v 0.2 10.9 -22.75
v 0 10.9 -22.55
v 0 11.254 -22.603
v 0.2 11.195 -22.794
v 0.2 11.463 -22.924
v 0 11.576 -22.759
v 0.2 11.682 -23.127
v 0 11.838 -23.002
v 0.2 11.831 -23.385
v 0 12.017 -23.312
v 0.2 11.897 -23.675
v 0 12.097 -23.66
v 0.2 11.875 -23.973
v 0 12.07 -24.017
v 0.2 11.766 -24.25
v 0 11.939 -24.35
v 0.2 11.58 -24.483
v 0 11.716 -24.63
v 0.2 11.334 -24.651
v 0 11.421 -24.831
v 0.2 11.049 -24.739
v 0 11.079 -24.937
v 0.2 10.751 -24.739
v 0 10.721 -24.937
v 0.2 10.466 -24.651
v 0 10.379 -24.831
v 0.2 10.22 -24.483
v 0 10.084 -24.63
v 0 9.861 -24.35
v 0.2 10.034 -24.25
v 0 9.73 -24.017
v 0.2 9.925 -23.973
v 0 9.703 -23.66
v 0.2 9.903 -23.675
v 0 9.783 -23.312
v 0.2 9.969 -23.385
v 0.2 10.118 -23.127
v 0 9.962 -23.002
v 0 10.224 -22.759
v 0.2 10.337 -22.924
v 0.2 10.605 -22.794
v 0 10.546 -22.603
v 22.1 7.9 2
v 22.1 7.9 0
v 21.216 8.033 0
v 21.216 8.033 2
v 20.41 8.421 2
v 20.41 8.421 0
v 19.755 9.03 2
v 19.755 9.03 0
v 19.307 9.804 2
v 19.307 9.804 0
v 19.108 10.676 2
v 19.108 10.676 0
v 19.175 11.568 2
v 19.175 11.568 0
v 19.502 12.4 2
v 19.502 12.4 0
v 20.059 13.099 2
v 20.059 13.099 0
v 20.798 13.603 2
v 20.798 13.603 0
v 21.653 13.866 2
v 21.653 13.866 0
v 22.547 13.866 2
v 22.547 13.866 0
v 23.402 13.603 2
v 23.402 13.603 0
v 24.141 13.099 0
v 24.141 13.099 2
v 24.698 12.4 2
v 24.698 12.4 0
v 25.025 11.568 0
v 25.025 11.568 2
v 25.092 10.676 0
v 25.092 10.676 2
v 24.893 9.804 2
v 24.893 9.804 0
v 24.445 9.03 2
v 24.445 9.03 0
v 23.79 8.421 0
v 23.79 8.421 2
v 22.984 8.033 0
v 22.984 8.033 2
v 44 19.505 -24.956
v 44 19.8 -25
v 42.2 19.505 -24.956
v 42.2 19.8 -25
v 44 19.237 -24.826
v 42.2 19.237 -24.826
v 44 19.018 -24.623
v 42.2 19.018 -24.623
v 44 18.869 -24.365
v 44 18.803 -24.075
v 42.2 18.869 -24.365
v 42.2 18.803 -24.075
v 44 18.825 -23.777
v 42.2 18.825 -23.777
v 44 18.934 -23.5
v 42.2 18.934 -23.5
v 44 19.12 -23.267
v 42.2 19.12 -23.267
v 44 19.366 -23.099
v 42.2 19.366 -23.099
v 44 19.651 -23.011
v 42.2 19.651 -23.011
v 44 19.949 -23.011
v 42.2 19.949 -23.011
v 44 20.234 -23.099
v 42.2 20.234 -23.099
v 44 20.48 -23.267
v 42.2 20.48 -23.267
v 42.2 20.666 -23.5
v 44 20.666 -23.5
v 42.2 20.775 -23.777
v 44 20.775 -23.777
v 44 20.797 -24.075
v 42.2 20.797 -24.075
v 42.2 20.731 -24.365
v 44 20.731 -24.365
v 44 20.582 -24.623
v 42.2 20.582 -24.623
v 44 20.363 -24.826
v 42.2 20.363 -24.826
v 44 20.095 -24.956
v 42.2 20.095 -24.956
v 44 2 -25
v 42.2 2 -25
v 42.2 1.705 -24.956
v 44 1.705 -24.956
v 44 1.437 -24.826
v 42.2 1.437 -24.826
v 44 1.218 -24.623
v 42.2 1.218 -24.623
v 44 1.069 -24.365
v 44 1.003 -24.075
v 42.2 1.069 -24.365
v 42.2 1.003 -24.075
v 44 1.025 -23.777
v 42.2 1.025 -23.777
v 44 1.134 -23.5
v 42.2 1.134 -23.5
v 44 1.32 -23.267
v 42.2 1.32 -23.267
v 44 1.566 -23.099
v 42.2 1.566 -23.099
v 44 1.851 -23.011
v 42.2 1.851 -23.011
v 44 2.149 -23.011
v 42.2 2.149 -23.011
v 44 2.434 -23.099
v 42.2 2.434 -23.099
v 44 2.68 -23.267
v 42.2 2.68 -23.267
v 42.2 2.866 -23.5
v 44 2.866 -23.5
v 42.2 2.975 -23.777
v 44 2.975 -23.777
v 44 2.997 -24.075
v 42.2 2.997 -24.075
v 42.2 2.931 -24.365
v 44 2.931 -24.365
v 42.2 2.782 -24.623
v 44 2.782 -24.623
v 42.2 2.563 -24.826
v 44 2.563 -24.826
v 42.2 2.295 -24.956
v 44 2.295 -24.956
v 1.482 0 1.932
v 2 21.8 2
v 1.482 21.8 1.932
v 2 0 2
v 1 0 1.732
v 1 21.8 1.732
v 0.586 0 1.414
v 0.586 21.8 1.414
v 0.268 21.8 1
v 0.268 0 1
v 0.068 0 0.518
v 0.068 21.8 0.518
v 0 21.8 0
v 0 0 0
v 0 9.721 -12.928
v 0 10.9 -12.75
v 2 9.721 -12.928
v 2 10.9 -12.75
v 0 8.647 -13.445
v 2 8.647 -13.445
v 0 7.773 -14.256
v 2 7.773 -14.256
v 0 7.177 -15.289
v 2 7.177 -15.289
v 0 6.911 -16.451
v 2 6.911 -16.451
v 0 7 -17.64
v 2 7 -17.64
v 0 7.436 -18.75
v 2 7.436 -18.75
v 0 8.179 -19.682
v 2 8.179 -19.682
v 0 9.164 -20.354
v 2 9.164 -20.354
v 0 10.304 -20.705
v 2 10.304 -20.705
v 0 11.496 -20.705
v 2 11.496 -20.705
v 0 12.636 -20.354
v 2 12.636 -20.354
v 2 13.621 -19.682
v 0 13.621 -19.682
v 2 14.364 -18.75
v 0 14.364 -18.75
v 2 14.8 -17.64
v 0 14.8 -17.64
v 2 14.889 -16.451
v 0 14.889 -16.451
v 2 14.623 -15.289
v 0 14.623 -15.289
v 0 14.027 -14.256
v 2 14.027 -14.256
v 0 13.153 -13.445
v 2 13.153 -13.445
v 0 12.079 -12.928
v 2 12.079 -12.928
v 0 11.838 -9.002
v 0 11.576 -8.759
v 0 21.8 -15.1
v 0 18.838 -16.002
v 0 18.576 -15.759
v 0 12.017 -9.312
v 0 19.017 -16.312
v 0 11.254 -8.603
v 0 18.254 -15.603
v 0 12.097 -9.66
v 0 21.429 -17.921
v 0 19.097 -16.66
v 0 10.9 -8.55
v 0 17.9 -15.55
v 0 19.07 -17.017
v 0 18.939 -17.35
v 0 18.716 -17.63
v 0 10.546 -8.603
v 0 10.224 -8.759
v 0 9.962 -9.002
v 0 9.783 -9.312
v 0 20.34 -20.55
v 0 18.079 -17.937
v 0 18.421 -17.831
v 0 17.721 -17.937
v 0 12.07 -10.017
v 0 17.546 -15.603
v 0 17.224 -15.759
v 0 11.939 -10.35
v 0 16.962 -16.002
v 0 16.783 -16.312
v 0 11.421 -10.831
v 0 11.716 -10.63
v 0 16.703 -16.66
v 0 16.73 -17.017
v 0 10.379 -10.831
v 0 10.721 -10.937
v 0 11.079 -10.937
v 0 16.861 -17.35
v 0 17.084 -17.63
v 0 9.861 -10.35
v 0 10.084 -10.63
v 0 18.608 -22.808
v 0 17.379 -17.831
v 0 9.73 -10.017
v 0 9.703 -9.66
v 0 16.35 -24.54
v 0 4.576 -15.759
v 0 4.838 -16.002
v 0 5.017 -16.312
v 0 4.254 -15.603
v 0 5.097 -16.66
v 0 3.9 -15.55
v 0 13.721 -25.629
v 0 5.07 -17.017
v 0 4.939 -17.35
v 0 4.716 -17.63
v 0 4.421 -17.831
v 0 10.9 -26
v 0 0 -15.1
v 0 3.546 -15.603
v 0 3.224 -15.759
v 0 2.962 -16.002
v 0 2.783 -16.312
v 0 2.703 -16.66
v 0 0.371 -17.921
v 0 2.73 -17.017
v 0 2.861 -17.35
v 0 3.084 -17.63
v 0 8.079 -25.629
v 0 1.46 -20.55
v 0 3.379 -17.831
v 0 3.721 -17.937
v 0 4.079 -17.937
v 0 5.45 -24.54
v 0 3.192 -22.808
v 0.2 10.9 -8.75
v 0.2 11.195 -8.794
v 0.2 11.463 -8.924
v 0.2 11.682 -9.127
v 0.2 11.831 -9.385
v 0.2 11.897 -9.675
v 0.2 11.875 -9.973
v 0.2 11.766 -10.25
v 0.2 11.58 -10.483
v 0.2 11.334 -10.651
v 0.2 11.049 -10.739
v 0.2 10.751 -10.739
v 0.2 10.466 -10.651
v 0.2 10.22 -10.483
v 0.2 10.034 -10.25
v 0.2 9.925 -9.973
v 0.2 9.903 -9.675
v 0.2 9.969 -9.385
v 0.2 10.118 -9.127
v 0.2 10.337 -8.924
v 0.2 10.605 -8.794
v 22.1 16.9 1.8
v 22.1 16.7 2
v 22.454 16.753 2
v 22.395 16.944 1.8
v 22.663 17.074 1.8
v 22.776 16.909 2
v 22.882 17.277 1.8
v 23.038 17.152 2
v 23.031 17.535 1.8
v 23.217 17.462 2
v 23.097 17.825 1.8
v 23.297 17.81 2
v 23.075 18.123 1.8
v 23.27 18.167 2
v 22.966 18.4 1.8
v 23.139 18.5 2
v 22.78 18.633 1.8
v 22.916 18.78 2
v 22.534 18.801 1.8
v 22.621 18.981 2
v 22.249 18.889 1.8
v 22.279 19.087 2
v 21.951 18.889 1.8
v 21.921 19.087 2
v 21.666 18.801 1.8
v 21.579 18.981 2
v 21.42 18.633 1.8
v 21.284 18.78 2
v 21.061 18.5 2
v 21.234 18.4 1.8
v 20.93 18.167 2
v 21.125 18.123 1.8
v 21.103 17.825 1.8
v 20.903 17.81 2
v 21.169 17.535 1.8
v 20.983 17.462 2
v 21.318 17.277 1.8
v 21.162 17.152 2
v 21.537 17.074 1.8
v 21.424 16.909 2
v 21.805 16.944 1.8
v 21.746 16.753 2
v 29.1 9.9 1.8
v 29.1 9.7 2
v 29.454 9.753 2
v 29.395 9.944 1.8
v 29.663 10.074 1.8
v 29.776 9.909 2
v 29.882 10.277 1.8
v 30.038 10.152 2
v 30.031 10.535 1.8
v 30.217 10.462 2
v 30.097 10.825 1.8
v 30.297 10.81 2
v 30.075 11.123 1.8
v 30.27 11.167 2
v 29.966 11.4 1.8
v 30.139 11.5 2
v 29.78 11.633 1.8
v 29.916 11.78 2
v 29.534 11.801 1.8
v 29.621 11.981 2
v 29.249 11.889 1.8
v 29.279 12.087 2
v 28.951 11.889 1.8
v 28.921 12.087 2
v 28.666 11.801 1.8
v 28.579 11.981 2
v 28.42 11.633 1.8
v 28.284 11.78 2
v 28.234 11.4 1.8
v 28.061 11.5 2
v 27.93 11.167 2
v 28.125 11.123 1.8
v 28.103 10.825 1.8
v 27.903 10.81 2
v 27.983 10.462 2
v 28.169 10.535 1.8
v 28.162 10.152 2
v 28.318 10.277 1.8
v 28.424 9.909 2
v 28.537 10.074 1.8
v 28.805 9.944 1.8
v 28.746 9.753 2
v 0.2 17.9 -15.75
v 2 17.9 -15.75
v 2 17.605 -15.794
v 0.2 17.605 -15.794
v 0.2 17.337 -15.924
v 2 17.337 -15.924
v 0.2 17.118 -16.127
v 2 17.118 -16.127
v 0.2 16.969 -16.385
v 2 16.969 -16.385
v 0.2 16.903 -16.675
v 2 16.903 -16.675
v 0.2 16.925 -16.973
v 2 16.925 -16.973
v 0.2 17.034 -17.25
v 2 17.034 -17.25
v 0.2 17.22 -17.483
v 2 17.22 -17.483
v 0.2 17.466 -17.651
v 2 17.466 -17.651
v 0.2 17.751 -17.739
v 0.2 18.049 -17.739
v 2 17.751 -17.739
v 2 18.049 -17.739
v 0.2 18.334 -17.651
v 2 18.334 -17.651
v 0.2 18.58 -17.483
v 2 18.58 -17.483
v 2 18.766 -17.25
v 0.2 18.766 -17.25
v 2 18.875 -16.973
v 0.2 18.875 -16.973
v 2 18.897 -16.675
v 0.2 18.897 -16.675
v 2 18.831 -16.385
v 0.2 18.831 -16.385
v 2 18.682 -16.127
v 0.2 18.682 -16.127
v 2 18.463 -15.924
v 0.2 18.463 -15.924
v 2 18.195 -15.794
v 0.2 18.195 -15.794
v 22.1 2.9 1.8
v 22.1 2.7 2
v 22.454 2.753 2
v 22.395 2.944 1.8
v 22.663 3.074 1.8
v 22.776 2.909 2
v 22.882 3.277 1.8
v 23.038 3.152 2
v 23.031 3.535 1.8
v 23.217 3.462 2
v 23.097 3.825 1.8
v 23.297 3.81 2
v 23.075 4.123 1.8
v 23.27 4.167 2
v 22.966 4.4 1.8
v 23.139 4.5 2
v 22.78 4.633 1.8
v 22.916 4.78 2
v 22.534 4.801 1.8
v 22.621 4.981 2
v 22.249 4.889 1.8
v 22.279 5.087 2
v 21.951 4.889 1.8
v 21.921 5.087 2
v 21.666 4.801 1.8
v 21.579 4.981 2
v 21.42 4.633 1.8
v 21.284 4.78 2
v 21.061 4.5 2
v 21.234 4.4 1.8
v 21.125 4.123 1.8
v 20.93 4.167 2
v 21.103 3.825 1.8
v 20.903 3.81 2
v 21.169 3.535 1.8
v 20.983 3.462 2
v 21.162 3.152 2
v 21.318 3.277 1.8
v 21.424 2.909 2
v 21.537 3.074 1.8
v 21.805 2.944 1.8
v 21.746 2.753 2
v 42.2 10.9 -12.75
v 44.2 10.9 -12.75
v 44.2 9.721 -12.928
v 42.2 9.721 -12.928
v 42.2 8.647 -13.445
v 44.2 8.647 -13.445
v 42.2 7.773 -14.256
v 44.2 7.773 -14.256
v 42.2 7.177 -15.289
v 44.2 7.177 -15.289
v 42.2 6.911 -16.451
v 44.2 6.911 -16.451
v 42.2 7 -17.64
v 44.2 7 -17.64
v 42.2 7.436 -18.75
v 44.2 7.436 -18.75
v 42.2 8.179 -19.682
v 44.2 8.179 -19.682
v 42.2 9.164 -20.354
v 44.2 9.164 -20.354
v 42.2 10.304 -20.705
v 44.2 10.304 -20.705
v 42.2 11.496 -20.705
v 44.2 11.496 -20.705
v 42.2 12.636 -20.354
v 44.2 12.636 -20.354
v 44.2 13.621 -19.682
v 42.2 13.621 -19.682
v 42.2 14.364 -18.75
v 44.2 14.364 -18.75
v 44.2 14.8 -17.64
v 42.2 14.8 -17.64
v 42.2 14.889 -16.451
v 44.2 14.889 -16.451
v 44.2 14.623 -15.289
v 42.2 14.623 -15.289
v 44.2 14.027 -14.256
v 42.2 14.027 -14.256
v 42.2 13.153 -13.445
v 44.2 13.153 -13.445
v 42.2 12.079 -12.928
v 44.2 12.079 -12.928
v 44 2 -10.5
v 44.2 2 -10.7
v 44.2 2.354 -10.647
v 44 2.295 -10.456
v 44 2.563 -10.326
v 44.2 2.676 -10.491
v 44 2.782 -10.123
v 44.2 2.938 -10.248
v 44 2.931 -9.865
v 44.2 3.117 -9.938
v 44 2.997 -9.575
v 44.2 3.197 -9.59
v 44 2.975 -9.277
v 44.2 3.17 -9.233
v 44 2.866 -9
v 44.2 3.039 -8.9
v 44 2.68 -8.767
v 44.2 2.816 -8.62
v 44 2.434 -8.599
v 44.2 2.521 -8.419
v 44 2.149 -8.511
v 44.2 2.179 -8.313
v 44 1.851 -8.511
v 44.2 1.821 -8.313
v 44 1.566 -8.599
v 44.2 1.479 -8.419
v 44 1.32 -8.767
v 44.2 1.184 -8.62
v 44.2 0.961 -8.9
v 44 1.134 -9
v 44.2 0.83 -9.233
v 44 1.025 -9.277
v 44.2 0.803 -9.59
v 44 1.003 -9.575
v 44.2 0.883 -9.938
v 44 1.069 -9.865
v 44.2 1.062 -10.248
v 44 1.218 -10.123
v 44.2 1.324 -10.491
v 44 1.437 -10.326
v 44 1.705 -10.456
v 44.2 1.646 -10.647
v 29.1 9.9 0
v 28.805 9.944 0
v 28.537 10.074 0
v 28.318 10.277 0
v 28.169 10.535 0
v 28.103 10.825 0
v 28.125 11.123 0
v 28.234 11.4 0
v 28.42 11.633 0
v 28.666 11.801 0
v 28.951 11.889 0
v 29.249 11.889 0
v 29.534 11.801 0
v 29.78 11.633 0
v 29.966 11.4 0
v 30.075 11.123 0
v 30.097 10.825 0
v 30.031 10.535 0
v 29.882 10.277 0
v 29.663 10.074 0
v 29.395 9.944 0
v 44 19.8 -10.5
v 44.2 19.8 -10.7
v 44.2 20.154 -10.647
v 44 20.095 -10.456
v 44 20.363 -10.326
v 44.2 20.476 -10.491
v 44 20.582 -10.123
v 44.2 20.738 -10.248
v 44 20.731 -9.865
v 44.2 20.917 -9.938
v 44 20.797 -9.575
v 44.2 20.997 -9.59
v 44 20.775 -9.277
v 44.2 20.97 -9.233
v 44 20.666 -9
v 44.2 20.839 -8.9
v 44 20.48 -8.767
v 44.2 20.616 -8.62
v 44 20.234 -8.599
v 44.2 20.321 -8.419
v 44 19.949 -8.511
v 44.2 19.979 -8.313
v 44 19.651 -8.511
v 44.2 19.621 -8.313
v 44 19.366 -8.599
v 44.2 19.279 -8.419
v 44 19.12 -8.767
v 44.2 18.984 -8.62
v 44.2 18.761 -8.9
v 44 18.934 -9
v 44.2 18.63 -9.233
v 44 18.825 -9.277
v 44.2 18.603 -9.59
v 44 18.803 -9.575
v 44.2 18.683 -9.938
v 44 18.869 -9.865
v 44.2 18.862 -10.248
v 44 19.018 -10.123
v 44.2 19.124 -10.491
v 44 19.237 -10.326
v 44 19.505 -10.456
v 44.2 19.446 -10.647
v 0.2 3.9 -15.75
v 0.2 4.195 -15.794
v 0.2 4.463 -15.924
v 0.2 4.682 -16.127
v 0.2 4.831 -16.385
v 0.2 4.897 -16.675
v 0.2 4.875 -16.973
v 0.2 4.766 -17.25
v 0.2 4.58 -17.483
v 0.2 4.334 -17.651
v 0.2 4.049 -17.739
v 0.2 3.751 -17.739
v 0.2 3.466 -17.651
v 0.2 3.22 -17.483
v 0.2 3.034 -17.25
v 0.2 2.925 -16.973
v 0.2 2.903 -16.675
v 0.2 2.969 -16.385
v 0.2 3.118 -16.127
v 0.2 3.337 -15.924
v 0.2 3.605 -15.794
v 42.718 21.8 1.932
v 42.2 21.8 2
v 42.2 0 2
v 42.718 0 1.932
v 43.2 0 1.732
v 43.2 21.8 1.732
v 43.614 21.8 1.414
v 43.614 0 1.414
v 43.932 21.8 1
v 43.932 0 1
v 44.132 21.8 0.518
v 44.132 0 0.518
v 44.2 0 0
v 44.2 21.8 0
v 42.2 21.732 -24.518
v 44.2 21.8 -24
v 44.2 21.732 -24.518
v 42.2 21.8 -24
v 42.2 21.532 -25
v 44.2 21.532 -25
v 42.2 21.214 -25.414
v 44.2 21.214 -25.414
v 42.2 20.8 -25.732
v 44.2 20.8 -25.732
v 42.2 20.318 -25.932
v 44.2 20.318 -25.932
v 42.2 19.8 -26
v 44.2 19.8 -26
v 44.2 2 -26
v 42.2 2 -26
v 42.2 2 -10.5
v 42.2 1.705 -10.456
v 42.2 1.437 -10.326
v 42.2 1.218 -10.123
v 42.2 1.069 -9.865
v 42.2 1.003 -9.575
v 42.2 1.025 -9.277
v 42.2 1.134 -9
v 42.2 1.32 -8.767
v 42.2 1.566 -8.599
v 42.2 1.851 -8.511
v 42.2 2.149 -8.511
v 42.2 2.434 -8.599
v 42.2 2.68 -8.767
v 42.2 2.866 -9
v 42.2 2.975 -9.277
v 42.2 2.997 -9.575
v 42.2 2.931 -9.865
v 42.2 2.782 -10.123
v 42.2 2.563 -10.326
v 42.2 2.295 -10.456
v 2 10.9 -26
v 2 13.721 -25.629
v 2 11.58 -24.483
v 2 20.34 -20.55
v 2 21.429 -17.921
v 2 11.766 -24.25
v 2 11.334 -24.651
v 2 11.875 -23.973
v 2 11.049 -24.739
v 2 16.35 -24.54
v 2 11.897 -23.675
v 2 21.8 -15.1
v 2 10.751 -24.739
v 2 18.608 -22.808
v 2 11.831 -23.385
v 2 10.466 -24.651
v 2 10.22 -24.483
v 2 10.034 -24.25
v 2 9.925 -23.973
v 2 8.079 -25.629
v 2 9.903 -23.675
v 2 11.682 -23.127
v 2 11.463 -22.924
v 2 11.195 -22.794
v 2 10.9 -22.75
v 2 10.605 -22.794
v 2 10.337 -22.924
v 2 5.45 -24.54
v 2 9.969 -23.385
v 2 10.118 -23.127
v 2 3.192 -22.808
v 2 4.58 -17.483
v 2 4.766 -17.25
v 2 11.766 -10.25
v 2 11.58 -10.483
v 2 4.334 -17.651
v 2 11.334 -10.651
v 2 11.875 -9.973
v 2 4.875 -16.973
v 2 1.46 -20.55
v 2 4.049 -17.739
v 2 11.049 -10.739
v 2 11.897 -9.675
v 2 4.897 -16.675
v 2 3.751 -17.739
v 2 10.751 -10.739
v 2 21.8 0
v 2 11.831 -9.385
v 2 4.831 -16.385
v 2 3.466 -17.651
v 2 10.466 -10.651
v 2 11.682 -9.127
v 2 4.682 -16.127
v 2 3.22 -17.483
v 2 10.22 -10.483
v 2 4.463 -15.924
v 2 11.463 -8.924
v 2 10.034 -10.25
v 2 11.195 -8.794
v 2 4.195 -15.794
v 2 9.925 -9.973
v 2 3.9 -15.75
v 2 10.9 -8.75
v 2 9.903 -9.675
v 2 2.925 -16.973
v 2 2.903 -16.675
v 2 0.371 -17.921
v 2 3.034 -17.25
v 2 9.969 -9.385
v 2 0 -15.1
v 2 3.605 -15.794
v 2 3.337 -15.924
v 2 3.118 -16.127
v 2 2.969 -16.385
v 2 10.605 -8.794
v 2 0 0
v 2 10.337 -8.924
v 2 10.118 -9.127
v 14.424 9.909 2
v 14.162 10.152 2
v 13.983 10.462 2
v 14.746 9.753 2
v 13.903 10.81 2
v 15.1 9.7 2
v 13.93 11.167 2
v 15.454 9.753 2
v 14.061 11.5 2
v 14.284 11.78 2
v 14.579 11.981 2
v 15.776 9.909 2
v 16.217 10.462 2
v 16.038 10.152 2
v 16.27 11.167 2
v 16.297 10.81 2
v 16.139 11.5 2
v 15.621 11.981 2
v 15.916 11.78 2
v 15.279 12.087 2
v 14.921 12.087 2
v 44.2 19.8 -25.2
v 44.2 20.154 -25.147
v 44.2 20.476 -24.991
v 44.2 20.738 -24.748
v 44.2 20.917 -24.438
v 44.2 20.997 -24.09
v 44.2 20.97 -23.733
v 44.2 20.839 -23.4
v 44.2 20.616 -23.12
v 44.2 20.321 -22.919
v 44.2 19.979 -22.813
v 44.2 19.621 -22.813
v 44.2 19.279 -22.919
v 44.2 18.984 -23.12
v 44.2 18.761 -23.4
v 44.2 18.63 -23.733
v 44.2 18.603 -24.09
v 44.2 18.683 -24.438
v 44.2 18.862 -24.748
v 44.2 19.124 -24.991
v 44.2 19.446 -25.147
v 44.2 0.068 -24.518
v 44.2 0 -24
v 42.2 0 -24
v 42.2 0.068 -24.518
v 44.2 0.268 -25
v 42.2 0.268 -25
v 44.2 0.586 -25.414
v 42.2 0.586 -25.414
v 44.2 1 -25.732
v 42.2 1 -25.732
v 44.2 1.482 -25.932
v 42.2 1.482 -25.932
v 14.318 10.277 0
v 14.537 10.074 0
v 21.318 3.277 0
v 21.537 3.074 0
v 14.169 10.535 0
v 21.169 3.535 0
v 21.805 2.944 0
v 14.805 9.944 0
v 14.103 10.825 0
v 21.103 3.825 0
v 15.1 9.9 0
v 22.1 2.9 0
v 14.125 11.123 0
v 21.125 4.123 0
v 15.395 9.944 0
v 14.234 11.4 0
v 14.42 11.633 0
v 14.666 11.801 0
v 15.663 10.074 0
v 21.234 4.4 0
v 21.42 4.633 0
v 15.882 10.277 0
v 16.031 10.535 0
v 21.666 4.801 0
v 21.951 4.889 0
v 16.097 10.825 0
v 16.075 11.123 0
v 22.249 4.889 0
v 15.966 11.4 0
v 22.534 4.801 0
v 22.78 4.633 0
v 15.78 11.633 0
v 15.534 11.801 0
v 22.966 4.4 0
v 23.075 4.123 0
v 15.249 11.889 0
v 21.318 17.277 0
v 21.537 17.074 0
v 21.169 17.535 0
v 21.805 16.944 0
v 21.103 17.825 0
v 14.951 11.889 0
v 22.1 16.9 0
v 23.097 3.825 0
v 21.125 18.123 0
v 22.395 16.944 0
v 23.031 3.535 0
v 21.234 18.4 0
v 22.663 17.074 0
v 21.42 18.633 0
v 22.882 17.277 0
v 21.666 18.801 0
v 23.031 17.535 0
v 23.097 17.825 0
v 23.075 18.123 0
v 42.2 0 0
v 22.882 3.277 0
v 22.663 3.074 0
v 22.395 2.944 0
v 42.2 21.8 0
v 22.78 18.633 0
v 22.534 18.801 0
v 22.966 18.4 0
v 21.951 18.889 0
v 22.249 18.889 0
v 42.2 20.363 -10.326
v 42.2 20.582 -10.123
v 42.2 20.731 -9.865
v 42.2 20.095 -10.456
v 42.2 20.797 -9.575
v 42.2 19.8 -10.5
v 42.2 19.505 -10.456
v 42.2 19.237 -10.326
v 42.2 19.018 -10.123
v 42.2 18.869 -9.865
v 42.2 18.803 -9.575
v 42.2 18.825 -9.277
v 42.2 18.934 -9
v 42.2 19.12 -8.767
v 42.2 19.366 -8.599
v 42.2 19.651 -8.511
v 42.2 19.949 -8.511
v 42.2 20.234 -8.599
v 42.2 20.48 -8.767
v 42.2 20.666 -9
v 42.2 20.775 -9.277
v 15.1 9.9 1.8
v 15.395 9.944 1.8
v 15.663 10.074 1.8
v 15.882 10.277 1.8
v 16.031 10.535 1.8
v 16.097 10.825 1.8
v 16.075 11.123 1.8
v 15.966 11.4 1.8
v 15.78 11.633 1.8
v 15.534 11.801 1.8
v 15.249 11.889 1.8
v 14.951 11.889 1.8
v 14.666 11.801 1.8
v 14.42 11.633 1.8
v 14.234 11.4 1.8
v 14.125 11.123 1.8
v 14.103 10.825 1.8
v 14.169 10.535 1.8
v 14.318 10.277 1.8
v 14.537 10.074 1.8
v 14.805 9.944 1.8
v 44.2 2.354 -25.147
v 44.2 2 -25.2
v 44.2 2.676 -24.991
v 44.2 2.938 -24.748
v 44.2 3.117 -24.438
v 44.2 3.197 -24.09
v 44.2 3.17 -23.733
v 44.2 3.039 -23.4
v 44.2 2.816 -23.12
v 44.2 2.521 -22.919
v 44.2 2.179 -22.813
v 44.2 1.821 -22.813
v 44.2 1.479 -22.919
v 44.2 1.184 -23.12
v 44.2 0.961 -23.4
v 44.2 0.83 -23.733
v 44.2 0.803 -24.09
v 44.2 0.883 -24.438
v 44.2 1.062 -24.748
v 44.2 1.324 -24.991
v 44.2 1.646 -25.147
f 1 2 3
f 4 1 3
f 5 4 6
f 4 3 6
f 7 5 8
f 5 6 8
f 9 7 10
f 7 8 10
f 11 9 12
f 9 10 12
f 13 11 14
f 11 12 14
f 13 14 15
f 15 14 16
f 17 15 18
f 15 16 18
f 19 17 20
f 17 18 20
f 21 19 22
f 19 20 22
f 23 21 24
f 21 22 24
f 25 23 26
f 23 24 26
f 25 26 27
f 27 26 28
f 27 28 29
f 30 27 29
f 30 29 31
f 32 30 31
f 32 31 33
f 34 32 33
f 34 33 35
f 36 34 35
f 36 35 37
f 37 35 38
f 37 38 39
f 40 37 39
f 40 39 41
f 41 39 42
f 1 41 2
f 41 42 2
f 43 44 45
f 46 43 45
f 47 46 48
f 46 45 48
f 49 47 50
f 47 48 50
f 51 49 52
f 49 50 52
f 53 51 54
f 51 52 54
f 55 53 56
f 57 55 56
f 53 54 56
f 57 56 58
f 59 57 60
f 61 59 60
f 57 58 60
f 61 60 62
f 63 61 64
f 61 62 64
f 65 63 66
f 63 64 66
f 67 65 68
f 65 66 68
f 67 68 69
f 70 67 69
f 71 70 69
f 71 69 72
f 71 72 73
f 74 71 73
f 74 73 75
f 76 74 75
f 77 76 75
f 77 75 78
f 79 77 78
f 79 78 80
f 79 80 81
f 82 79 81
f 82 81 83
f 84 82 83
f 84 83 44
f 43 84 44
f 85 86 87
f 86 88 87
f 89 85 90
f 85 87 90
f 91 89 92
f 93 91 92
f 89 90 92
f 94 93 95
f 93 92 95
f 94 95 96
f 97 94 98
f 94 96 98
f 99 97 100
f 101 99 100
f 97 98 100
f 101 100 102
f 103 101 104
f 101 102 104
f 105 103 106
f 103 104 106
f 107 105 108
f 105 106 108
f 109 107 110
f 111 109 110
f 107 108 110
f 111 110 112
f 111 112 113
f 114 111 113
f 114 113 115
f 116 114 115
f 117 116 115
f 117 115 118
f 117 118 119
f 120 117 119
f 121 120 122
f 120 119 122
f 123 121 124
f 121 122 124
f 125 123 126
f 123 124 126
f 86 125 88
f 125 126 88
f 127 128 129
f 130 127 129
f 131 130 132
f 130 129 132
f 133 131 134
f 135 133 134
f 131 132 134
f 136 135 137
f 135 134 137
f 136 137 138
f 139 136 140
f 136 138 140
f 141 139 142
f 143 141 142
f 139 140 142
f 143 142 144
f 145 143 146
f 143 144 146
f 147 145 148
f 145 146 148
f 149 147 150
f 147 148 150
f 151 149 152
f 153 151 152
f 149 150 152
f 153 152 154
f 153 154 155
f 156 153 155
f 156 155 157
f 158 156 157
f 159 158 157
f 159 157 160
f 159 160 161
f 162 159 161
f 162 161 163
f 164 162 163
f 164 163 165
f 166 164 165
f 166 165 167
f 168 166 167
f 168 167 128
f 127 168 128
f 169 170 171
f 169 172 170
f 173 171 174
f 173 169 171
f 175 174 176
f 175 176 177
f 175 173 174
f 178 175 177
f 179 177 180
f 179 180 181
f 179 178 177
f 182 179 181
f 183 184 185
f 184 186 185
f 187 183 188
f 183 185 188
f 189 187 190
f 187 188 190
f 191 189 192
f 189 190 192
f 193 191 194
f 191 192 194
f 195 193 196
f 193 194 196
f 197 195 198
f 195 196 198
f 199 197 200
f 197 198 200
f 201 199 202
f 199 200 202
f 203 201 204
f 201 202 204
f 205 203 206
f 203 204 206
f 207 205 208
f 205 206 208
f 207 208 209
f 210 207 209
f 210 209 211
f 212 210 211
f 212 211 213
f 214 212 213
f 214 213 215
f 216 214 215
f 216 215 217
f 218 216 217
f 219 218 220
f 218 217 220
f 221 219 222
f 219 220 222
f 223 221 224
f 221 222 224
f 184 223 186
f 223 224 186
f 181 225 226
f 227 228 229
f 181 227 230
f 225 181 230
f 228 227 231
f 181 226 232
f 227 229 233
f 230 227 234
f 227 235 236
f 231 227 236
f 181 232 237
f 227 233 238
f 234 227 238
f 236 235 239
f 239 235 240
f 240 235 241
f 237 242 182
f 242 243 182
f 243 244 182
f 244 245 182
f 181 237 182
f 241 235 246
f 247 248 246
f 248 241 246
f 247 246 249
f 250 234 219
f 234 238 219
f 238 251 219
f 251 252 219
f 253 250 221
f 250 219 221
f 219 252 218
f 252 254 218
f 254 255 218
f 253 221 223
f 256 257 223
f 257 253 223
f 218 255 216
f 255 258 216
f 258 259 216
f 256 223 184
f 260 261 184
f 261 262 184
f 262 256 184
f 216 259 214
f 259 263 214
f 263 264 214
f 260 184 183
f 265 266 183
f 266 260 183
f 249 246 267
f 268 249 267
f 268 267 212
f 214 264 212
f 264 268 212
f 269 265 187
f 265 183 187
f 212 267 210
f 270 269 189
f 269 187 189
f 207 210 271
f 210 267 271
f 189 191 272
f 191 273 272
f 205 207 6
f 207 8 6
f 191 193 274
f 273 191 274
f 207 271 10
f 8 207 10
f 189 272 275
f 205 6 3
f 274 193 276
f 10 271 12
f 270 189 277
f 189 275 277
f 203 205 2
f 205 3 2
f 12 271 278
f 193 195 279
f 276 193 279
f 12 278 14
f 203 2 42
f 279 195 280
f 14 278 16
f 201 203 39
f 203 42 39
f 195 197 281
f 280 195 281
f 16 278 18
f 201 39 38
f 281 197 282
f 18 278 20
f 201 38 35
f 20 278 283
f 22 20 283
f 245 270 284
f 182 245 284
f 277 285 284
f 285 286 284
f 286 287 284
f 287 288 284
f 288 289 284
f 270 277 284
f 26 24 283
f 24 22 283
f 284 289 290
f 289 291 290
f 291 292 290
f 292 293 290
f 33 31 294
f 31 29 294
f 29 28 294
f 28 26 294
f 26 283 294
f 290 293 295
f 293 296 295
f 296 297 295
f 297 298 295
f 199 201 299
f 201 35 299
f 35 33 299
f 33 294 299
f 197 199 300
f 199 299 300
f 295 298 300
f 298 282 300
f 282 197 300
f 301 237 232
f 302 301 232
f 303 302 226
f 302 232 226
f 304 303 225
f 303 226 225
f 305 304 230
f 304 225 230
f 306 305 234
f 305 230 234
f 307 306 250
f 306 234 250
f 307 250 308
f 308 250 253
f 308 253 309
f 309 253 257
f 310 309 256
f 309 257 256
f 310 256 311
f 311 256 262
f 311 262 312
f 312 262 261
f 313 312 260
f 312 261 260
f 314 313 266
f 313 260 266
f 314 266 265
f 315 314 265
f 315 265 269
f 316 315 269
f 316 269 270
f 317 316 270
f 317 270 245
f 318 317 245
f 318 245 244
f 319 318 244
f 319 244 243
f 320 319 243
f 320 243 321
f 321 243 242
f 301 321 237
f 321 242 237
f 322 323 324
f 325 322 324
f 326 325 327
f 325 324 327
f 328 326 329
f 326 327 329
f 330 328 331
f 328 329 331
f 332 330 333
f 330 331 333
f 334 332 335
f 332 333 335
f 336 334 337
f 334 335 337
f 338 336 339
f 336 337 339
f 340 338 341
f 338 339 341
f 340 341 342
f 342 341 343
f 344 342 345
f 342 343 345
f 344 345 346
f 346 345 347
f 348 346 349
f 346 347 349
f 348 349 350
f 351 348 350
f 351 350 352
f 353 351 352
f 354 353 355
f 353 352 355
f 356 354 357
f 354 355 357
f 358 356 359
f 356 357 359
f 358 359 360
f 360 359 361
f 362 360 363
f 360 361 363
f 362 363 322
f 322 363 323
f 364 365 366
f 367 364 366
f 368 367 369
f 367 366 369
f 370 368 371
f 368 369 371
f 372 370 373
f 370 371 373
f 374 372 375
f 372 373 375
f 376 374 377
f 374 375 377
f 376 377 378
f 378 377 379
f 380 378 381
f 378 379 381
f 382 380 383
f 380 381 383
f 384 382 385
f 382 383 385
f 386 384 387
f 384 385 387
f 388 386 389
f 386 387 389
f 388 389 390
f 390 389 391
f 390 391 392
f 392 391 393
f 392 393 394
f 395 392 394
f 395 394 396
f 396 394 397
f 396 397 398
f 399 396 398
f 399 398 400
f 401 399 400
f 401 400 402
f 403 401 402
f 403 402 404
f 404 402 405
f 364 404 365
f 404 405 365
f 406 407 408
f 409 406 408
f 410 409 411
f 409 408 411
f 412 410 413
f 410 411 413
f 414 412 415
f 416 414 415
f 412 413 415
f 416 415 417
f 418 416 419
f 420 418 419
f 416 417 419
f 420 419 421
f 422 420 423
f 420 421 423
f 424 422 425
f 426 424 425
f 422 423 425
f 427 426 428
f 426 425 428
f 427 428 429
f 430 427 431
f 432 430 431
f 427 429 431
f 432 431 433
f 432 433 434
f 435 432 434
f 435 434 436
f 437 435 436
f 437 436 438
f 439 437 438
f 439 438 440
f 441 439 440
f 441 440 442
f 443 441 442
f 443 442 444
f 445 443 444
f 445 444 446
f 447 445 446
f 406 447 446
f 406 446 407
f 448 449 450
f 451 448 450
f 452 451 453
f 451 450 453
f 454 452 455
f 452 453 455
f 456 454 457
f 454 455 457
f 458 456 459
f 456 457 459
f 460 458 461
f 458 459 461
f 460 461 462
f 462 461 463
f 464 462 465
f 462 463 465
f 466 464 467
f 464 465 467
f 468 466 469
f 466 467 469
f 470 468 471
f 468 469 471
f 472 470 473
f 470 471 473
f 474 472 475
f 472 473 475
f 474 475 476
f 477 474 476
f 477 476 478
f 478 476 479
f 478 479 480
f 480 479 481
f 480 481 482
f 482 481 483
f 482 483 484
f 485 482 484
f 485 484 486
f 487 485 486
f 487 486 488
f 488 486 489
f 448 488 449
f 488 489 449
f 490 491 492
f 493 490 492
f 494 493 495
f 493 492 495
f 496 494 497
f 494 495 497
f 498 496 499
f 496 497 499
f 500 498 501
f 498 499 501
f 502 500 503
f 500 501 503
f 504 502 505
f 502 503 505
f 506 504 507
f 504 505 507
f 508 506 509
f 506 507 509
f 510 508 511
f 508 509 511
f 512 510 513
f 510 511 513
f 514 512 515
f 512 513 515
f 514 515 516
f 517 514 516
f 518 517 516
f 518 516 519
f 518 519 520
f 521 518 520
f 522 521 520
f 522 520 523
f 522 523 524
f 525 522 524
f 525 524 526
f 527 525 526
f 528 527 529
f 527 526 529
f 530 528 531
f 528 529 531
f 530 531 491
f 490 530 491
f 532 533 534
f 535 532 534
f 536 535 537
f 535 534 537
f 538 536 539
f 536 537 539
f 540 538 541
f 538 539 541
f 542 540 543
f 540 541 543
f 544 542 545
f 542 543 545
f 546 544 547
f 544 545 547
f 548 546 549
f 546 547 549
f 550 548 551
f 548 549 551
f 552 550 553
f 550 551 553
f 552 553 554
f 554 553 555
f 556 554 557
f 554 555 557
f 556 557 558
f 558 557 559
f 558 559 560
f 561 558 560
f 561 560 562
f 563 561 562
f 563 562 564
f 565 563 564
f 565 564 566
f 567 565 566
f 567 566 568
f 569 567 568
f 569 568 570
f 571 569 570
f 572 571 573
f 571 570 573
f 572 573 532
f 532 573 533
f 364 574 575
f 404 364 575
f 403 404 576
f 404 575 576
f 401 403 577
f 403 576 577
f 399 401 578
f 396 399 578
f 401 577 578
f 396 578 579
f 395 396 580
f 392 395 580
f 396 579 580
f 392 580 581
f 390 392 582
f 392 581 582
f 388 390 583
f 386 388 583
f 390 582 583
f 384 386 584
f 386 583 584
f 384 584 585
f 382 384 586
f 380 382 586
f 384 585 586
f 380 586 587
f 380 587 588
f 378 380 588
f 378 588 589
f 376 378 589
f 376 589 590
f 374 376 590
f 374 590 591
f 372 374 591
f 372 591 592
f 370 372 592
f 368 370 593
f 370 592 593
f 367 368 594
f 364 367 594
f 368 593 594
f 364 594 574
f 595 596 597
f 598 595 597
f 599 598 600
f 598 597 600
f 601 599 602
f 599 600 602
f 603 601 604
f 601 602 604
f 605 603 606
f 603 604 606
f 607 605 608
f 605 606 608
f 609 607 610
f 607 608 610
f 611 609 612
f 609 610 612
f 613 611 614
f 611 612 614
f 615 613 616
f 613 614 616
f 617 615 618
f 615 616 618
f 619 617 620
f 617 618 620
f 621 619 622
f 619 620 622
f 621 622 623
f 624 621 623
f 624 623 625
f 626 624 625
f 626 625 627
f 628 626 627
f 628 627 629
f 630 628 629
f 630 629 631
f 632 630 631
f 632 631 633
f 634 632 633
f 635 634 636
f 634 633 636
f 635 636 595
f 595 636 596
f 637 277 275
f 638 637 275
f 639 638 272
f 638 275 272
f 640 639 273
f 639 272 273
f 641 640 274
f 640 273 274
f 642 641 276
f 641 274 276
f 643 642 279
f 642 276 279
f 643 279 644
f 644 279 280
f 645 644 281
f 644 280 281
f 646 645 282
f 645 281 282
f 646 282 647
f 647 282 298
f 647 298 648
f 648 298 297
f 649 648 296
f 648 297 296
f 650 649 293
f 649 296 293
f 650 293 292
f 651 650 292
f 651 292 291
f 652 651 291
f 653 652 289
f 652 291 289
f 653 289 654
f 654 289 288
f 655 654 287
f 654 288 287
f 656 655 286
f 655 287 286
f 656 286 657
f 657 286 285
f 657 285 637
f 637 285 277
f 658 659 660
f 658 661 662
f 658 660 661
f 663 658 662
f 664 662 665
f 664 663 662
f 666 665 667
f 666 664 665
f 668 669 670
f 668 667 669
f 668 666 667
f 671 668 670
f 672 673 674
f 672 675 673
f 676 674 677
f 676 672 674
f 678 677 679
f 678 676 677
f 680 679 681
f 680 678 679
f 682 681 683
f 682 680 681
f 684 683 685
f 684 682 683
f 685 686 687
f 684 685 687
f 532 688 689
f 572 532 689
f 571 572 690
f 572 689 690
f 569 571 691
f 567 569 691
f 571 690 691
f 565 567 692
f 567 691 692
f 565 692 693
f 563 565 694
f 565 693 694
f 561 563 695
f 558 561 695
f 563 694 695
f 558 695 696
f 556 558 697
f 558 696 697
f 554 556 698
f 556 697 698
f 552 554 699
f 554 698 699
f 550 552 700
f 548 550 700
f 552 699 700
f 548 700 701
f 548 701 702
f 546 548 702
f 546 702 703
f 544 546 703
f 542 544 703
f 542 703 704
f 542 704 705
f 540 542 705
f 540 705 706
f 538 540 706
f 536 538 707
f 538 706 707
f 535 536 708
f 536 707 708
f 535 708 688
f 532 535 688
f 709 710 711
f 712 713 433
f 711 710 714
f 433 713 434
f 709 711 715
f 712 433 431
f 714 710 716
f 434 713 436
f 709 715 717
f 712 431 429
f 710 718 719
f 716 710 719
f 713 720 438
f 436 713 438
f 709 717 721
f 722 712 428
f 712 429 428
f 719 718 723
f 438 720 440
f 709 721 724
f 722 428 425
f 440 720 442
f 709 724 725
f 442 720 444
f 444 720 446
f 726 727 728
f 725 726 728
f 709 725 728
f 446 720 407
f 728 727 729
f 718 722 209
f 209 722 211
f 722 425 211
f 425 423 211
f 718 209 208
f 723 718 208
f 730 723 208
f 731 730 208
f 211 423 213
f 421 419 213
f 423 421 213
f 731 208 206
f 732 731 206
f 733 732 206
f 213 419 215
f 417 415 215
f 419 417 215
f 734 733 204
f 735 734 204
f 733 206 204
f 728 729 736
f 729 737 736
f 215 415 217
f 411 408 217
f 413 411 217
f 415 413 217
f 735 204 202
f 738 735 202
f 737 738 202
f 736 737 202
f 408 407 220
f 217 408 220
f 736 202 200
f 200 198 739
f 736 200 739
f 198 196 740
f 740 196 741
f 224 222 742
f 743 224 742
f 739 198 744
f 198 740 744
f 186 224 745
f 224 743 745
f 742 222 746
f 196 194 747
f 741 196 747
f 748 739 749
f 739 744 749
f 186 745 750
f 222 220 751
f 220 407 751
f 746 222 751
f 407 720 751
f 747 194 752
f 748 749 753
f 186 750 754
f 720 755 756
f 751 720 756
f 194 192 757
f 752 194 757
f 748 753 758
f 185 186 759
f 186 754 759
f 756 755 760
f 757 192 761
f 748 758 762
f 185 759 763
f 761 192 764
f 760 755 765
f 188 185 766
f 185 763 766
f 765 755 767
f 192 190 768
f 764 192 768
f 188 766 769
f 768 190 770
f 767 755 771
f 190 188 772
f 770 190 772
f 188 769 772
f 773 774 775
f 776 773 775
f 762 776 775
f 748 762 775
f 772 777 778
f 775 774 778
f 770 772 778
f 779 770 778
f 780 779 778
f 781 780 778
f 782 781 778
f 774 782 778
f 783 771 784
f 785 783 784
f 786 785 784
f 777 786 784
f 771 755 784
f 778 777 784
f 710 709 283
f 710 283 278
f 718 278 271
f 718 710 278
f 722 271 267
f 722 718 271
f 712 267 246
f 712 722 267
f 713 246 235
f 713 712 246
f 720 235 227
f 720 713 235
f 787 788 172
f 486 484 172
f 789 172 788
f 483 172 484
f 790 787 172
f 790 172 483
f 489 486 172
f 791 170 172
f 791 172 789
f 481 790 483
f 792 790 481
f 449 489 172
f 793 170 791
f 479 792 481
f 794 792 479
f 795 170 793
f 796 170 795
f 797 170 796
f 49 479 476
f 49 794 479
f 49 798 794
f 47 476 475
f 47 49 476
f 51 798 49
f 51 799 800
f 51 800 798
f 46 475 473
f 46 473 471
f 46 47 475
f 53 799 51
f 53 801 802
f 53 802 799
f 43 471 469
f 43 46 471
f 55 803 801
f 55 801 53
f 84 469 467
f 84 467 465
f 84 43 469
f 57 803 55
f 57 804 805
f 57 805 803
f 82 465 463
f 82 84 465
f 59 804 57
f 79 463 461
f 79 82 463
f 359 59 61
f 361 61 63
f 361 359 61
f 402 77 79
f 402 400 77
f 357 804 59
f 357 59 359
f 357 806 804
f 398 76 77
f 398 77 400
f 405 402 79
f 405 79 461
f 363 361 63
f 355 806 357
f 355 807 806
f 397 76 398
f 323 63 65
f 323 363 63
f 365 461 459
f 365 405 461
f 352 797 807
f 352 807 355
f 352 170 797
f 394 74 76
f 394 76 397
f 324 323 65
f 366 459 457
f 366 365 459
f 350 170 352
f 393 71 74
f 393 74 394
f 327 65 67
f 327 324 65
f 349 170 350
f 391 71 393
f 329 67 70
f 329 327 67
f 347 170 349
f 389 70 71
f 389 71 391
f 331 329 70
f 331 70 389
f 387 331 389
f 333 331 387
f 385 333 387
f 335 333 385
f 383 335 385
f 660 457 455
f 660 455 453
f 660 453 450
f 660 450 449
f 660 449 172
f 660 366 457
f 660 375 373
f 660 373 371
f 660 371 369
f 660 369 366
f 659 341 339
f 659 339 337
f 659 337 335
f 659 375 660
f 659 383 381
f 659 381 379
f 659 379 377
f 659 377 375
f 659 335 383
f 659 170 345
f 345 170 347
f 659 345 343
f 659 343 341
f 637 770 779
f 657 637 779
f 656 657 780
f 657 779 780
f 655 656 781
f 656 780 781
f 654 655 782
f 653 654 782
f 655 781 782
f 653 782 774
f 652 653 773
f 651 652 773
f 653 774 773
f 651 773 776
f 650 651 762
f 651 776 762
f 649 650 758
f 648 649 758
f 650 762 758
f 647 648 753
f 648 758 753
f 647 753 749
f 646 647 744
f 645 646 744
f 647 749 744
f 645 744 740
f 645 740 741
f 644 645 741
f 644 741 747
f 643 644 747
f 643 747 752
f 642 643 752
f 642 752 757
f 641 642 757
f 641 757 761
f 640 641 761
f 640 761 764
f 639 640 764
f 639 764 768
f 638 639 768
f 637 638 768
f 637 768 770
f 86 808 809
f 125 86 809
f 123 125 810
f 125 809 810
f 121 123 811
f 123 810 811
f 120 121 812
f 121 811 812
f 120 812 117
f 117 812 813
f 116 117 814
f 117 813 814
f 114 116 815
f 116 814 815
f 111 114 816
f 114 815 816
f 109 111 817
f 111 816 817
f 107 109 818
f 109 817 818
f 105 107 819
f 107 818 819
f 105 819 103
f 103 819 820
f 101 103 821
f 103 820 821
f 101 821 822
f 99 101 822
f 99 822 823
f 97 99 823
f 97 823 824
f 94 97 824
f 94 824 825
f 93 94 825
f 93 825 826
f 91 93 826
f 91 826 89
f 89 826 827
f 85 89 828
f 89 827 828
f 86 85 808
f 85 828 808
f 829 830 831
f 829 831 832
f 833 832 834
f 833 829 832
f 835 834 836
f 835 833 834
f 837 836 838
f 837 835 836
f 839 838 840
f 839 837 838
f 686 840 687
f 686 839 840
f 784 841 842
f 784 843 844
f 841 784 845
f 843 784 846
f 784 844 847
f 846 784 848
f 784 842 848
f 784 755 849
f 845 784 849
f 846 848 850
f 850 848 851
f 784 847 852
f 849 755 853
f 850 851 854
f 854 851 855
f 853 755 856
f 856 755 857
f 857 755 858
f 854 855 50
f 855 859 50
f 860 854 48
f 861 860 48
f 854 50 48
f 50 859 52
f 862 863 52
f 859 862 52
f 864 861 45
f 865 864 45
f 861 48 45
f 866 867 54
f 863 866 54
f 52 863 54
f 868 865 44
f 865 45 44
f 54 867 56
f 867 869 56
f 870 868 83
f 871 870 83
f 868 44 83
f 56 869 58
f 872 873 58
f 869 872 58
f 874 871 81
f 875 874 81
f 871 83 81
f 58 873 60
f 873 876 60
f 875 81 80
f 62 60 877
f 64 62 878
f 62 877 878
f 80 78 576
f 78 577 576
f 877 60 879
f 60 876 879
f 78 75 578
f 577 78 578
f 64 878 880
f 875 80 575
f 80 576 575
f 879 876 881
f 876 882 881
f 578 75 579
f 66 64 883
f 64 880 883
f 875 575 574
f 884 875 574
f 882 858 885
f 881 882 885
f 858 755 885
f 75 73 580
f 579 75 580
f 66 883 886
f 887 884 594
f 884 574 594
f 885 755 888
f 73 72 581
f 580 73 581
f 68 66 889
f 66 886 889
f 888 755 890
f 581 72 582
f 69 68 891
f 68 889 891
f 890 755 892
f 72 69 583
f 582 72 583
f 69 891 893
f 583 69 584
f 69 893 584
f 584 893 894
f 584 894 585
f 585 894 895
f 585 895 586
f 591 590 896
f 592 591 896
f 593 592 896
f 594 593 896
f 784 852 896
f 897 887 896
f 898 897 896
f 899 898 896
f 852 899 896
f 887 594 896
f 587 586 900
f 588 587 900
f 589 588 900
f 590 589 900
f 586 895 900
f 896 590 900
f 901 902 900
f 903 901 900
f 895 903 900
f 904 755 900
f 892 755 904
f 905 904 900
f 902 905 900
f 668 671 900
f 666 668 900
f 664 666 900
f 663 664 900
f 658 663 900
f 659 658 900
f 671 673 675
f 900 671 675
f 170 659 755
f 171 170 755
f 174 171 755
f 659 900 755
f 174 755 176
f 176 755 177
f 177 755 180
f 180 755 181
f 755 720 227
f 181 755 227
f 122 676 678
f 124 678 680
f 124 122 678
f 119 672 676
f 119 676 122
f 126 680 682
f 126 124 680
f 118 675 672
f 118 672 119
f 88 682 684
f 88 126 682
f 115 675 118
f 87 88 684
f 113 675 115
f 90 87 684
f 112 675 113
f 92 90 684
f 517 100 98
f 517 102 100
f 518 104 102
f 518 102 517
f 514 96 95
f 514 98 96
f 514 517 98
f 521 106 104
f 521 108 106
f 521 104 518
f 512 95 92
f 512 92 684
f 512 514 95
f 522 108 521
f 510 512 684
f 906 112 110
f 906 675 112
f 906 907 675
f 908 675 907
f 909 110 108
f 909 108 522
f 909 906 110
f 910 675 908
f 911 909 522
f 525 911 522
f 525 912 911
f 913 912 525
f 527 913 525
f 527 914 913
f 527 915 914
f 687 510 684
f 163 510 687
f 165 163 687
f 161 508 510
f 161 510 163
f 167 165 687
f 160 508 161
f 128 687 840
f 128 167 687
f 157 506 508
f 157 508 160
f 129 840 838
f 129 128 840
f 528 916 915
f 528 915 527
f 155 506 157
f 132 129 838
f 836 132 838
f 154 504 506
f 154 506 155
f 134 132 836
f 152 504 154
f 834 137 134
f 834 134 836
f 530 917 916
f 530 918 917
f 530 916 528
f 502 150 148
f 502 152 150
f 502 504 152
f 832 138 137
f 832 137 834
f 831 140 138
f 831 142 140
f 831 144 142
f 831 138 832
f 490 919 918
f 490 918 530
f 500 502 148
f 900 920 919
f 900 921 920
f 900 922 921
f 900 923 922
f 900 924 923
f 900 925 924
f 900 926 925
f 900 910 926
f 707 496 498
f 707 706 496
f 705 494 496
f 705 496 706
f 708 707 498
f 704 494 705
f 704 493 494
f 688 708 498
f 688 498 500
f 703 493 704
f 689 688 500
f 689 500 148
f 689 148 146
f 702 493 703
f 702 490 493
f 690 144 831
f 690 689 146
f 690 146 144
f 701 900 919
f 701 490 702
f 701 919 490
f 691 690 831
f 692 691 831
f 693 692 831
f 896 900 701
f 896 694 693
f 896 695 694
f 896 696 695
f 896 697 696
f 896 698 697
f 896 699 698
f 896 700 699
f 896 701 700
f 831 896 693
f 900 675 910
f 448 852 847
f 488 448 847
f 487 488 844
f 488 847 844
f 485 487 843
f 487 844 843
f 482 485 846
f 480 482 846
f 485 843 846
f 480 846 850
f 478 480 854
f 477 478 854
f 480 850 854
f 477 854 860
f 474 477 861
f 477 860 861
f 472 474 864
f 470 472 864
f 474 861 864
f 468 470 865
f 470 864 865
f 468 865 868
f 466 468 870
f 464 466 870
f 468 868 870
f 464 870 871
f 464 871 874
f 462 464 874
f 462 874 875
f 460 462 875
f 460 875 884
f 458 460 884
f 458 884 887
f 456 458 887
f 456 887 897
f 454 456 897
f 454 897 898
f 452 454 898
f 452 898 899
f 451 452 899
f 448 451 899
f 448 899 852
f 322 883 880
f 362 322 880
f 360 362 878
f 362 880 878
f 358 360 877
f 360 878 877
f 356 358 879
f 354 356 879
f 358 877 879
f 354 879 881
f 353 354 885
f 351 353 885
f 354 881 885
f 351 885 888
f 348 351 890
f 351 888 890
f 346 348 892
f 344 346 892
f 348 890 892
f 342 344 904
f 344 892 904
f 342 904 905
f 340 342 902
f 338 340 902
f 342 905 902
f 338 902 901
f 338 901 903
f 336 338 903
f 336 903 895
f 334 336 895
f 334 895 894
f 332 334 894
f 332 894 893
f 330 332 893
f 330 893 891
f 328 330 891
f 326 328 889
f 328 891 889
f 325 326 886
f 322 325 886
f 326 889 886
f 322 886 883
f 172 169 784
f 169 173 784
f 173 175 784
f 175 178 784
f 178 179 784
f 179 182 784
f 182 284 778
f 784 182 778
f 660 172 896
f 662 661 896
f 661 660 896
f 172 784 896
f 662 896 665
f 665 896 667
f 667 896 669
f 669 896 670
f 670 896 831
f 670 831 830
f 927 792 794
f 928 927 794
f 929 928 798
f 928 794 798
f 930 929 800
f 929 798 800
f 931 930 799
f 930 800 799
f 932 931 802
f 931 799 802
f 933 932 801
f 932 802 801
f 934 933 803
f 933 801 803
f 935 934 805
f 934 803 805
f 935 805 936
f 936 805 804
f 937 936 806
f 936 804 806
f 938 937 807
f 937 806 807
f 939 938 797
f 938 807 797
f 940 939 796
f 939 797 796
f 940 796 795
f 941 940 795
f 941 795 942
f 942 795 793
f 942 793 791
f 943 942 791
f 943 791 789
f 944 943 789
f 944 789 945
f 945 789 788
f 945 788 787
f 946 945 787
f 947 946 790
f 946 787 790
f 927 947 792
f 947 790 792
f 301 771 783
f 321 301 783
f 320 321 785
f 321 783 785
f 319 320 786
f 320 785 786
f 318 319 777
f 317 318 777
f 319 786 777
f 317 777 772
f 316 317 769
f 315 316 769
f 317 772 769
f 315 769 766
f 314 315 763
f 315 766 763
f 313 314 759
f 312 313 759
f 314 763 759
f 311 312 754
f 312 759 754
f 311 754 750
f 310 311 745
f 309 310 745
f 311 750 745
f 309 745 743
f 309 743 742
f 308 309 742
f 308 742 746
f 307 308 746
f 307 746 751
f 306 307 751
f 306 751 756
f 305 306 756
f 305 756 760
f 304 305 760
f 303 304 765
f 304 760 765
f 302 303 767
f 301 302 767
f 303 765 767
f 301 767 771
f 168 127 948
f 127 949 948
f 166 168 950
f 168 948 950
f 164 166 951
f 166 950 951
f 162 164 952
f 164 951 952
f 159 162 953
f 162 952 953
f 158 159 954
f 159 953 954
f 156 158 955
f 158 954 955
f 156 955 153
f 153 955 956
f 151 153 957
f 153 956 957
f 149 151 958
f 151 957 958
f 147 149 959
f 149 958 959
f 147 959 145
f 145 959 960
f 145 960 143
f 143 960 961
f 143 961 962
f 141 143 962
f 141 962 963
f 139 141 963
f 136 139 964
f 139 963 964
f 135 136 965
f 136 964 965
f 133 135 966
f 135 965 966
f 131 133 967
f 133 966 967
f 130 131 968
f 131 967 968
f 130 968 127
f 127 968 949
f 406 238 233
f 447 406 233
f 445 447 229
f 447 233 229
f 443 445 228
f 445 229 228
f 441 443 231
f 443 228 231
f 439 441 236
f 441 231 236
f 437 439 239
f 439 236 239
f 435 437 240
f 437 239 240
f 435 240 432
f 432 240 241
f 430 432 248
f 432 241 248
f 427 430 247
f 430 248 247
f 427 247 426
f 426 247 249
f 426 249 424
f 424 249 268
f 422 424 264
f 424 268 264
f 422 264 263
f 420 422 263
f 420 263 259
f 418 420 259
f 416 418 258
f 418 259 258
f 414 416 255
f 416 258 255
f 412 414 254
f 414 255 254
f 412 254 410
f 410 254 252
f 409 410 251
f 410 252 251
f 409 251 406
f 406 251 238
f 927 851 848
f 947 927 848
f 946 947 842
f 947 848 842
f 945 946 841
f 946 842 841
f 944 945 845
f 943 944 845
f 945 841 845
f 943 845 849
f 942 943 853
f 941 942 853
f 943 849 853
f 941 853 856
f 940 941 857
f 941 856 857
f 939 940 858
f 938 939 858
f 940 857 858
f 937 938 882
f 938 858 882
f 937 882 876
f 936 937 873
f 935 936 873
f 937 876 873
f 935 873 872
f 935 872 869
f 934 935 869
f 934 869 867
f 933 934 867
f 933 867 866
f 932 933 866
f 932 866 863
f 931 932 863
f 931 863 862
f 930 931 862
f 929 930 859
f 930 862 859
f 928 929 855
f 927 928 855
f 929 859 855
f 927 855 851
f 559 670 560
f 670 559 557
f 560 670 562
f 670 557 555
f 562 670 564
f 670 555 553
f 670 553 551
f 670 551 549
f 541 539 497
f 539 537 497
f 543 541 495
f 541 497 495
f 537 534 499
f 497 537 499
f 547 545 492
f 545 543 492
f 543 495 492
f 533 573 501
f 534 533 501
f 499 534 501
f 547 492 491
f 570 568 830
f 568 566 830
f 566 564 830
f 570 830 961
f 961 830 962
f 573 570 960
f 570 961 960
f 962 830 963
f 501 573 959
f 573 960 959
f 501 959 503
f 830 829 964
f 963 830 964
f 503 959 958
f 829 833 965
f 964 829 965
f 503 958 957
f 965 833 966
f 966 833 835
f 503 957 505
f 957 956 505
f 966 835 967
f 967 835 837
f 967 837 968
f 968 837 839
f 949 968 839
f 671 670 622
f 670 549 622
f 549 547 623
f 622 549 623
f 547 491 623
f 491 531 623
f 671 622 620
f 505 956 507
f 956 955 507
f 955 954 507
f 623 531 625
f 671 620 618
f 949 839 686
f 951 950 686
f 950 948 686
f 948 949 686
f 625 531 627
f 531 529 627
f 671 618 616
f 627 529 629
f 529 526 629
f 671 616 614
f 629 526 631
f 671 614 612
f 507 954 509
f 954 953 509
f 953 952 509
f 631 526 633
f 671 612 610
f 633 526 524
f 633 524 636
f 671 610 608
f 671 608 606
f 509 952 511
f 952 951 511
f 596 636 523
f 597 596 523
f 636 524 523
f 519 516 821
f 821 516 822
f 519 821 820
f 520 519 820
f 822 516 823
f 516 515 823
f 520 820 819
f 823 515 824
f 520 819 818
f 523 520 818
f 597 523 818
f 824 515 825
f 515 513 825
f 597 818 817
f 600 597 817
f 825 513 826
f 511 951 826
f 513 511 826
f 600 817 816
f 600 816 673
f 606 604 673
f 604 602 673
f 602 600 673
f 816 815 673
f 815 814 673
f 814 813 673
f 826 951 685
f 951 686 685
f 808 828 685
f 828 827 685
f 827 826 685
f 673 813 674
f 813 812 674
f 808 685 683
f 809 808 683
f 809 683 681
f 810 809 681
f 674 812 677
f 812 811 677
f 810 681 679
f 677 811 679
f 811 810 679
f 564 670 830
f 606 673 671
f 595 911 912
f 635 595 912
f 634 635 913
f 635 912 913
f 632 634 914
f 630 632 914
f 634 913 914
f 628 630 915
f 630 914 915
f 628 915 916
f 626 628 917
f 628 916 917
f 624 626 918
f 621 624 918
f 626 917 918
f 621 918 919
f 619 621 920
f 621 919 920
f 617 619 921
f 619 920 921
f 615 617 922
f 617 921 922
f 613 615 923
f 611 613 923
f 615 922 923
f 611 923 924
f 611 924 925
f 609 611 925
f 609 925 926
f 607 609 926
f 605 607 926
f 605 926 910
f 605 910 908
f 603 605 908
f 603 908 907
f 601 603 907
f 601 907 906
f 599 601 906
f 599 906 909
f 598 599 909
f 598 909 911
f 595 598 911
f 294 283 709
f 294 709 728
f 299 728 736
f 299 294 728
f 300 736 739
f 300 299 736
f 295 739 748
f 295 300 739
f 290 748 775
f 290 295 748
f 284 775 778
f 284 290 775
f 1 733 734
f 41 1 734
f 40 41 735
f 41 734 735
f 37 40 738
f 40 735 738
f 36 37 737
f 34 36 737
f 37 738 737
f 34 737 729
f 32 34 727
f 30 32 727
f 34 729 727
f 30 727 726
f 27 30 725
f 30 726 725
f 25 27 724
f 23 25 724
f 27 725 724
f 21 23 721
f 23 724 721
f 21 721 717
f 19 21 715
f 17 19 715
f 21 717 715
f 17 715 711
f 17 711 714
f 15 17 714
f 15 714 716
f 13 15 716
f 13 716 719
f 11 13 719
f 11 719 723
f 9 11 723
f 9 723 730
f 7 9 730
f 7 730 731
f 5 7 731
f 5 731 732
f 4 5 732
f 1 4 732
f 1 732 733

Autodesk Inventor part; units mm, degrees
ref_plane "YZ Plane" through (0, 0, 0) normal (1, 0, 0) x (0, 1, 0)
ref_plane "XZ Plane" through (0, 0, 0) normal (0, 1, 0) x (-1, 0, 0)
ref_plane "XY Plane" through (0, 0, 0) normal (0, 0, 1) x (1, 0, 0)
sketch "Sketch1" plane through (0, 0, 0) normal (0, 0, 1) x (1, 0, 0)
  line L0 (0, 0) -> (44.2, 0)
  line L1 (44.2, 0) -> (44.2, 21.8)
  line L2 (44.2, 21.8) -> (0, 21.8)
  line L3 (0, 21.8) -> (0, 0)
  dimension "d0" = 21.8
  dimension "d1" = 44.2
extrude "Extrusion1" add sketch "Sketch1" along normal blind 2
sketch "Sketch2" plane through (0, 0, 0) normal (0, 0, -1) x (-1, 0, 0)
  line L0 (0, 21.8) -> (-2, 21.8)
  line L1 (-2, 21.8) -> (-2, 0)
  line L2 (-2, 0) -> (0, 0)
  line L3 (0, 0) -> (0, 21.8)
  line L4 (-44.2, 0) -> (-44.2, 21.8) projected
  line L5 (0, 0) -> (-44.2, 0) projected
  line L6 (-44.2, 21.8) -> (-42.2, 21.8)
  line L7 (-42.2, 21.8) -> (-42.2, 0)
  line L8 (-42.2, 0) -> (-44.2, 0)
  line L9 (-44.2, 0) -> (-44.2, 21.8)
  dimension "d4" = 2
  dimension "d5" = 2
  dimension "d93" = 21.8
extrude "Extrusion2" add sketch "Sketch2" along normal blind 26
fillet "Fillet1" radius 10.9 2 edges at (1, 21.8, -26) (1, 0, -26)
fillet "Fillet2" radius 2 2 edges at (43.2, 21.8, -26) (43.2, 0, -26)
sketch "Sketch3" plane through (0, 0, 2) normal (-1, 0, 0) x (0, 0, 1)
  line L0 (-28, 19.8) -> (-28, 2) projected
  circle A0 centre (-18.75, 10.9) radius 7
  circle A1 centre (-25.75, 10.9) radius 1
  circle A2 centre (-18.75, 3.9) radius 1
  circle A3 centre (-11.75, 10.9) radius 1
  circle A4 centre (-18.75, 17.9) radius 1
  point P0 (-2, 0)
  dimension "d11" = 14
  dimension "d12" = 2
  dimension "d15" = 360
hole "Hole1" at (0, 17.9, -16.75) at (0, 10.9, -23.75) at (0, 3.9, -16.75) at (0, 10.9, -9.75) direction (1, 0, 0) diameter 2 depth 2
thread "Thread1" size "M2x0.4" class "6H" standard "ANSI Metric M Profile" length 2
thread "Thread2" size "M2x0.4" class "6H" standard "ANSI Metric M Profile" length 2
thread "Thread3" size "M2x0.4" class "6H" standard "ANSI Metric M Profile" length 2
thread "Thread4" size "M2x0.4" class "6H" standard "ANSI Metric M Profile" length 2
sketch "Sketch4" plane through (44.2, 0, 2) normal (1, 0, 0) x (0, 0, -1)
  line L0 (26, 21.8) -> (0, 21.8) projected
  arc A0 (28, 19.8) -> (26, 21.8) centre (26, 19.8) ccw projected
  circle A1 centre (11.5, 19.8) radius 1
  circle A2 centre (26, 19.8) radius 1
  line L1 (26, 0) -> (26, 2)
  circle A3 centre (26, 2) radius 1
  circle A4 centre (11.5, 2) radius 1
  point P0 (2, 0)
  dimension "d34" = 2
  dimension "d35" = 2
  dimension "d36" = 2
  dimension "d37" = 2
  dimension "d38" = 2
hole "Hole2" at (44.2, 19.8, -9.5) at (44.2, 19.8, -24) at (44.2, 2, -24) at (44.2, 2, -9.5) direction (-1, 0, 0) diameter 2 depth 2
thread "Thread5" size "M2x0.4" class "6H" standard "ANSI Metric M Profile" length 2
thread "Thread6" size "M2x0.4" class "6H" standard "ANSI Metric M Profile" length 2
thread "Thread7" size "M2x0.4" class "6H" standard "ANSI Metric M Profile" length 2
thread "Thread8" size "M2x0.4" class "6H" standard "ANSI Metric M Profile" length 2
fillet "Fillet3" radius 2 2 edges at (0, 10.9, 2) (44.2, 10.9, 2)
sketch "Sketch5" plane through (0, 21.8, -15.1) normal (-1, 0, 0) x (0, 0, 1)
  circle A0 centre (-1.65, -3.9) radius 1 projected
  circle A1 centre (-1.65, -17.9) radius 1 projected
  line L0 (-1.65, -3.9) -> (-1.65, -17.9)
  circle A2 centre (-1.65, -10.9) radius 4
  point P0 (15.1, -21.8)
  dimension "d55" = 8
hole "Hole3" at (0, 10.9, -16.75) direction (1, 0, 0) diameter 8 depth 44.75
sketch "Sketch6" plane through (0, 0, 2) normal (0, 0, 1) x (1, 0, 0)
  line L0 (2, 0) -> (42.2, 0) projected
  line L1 (22.1, 0) -> (22.1, 21.8)
  line L2 (42.2, 21.8) -> (2, 21.8) projected
  line L3 (44.4097, 10.9) -> (-11.7207, 10.9)
  circle A0 centre (22.1, 10.9) radius 3
  circle A1 centre (22.1, 10.9) radius 7
  circle A2 centre (22.1, 3.9) radius 1
  circle A3 centre (29.1, 10.9) radius 1
  circle A4 centre (22.1, 17.9) radius 1
  circle A5 centre (15.1, 10.9) radius 1
  point P0 (0, 0)
  dimension "d64" = 14
  dimension "d63" = 6
  dimension "d65" = 2
  dimension "d68" = 360
hole "Hole4" at (22.1, 3.9, 2) at (29.1, 10.9, 2) at (22.1, 17.9, 2) at (15.1, 10.9, 2) direction (0, 0, -1) diameter 2 depth 2
sketch "Sketch7" plane through (0, 0, 2) normal (0, 0, 1) x (1, 0, 0)
  circle A0 centre (22.1, 3.9) radius 1 projected
  circle A1 centre (22.1, 17.9) radius 1 projected
  line L0 (22.1, 3.9) -> (22.1, 17.9)
  circle A2 centre (22.1, 10.9) radius 3
  point P0 (0, 0)
  dimension "d77" = 6
hole "Hole5" at (22.1, 10.9, 2) direction (0, 0, -1) diameter 6 depth 2
thread "Thread9" size "M2x0.4" class "6H" standard "ANSI Metric M Profile" length 2
thread "Thread10" size "M2x0.4" class "6H" standard "ANSI Metric M Profile" length 2
thread "Thread11" size "M2x0.4" class "6H" standard "ANSI Metric M Profile" length 2
thread "Thread12" size "M2x0.4" class "6H" standard "ANSI Metric M Profile" length 2
chamfer "Chamfer1" distance 0.2 angle 45 12 edges at (44.2, 2, -8.5) (44.2, 19.8, -8.5) (44.2, 2, -23) (44.2, 19.8, -23) (22.1, 4.9, 2) (15.1, 11.9, 2) (29.1, 11.9, 2) (22.1, 18.9, 2) (0, 10.9, -10.75) (0, 17.9, -17.75) (0, 3.9, -17.75) (0, 10.9, -24.75)
